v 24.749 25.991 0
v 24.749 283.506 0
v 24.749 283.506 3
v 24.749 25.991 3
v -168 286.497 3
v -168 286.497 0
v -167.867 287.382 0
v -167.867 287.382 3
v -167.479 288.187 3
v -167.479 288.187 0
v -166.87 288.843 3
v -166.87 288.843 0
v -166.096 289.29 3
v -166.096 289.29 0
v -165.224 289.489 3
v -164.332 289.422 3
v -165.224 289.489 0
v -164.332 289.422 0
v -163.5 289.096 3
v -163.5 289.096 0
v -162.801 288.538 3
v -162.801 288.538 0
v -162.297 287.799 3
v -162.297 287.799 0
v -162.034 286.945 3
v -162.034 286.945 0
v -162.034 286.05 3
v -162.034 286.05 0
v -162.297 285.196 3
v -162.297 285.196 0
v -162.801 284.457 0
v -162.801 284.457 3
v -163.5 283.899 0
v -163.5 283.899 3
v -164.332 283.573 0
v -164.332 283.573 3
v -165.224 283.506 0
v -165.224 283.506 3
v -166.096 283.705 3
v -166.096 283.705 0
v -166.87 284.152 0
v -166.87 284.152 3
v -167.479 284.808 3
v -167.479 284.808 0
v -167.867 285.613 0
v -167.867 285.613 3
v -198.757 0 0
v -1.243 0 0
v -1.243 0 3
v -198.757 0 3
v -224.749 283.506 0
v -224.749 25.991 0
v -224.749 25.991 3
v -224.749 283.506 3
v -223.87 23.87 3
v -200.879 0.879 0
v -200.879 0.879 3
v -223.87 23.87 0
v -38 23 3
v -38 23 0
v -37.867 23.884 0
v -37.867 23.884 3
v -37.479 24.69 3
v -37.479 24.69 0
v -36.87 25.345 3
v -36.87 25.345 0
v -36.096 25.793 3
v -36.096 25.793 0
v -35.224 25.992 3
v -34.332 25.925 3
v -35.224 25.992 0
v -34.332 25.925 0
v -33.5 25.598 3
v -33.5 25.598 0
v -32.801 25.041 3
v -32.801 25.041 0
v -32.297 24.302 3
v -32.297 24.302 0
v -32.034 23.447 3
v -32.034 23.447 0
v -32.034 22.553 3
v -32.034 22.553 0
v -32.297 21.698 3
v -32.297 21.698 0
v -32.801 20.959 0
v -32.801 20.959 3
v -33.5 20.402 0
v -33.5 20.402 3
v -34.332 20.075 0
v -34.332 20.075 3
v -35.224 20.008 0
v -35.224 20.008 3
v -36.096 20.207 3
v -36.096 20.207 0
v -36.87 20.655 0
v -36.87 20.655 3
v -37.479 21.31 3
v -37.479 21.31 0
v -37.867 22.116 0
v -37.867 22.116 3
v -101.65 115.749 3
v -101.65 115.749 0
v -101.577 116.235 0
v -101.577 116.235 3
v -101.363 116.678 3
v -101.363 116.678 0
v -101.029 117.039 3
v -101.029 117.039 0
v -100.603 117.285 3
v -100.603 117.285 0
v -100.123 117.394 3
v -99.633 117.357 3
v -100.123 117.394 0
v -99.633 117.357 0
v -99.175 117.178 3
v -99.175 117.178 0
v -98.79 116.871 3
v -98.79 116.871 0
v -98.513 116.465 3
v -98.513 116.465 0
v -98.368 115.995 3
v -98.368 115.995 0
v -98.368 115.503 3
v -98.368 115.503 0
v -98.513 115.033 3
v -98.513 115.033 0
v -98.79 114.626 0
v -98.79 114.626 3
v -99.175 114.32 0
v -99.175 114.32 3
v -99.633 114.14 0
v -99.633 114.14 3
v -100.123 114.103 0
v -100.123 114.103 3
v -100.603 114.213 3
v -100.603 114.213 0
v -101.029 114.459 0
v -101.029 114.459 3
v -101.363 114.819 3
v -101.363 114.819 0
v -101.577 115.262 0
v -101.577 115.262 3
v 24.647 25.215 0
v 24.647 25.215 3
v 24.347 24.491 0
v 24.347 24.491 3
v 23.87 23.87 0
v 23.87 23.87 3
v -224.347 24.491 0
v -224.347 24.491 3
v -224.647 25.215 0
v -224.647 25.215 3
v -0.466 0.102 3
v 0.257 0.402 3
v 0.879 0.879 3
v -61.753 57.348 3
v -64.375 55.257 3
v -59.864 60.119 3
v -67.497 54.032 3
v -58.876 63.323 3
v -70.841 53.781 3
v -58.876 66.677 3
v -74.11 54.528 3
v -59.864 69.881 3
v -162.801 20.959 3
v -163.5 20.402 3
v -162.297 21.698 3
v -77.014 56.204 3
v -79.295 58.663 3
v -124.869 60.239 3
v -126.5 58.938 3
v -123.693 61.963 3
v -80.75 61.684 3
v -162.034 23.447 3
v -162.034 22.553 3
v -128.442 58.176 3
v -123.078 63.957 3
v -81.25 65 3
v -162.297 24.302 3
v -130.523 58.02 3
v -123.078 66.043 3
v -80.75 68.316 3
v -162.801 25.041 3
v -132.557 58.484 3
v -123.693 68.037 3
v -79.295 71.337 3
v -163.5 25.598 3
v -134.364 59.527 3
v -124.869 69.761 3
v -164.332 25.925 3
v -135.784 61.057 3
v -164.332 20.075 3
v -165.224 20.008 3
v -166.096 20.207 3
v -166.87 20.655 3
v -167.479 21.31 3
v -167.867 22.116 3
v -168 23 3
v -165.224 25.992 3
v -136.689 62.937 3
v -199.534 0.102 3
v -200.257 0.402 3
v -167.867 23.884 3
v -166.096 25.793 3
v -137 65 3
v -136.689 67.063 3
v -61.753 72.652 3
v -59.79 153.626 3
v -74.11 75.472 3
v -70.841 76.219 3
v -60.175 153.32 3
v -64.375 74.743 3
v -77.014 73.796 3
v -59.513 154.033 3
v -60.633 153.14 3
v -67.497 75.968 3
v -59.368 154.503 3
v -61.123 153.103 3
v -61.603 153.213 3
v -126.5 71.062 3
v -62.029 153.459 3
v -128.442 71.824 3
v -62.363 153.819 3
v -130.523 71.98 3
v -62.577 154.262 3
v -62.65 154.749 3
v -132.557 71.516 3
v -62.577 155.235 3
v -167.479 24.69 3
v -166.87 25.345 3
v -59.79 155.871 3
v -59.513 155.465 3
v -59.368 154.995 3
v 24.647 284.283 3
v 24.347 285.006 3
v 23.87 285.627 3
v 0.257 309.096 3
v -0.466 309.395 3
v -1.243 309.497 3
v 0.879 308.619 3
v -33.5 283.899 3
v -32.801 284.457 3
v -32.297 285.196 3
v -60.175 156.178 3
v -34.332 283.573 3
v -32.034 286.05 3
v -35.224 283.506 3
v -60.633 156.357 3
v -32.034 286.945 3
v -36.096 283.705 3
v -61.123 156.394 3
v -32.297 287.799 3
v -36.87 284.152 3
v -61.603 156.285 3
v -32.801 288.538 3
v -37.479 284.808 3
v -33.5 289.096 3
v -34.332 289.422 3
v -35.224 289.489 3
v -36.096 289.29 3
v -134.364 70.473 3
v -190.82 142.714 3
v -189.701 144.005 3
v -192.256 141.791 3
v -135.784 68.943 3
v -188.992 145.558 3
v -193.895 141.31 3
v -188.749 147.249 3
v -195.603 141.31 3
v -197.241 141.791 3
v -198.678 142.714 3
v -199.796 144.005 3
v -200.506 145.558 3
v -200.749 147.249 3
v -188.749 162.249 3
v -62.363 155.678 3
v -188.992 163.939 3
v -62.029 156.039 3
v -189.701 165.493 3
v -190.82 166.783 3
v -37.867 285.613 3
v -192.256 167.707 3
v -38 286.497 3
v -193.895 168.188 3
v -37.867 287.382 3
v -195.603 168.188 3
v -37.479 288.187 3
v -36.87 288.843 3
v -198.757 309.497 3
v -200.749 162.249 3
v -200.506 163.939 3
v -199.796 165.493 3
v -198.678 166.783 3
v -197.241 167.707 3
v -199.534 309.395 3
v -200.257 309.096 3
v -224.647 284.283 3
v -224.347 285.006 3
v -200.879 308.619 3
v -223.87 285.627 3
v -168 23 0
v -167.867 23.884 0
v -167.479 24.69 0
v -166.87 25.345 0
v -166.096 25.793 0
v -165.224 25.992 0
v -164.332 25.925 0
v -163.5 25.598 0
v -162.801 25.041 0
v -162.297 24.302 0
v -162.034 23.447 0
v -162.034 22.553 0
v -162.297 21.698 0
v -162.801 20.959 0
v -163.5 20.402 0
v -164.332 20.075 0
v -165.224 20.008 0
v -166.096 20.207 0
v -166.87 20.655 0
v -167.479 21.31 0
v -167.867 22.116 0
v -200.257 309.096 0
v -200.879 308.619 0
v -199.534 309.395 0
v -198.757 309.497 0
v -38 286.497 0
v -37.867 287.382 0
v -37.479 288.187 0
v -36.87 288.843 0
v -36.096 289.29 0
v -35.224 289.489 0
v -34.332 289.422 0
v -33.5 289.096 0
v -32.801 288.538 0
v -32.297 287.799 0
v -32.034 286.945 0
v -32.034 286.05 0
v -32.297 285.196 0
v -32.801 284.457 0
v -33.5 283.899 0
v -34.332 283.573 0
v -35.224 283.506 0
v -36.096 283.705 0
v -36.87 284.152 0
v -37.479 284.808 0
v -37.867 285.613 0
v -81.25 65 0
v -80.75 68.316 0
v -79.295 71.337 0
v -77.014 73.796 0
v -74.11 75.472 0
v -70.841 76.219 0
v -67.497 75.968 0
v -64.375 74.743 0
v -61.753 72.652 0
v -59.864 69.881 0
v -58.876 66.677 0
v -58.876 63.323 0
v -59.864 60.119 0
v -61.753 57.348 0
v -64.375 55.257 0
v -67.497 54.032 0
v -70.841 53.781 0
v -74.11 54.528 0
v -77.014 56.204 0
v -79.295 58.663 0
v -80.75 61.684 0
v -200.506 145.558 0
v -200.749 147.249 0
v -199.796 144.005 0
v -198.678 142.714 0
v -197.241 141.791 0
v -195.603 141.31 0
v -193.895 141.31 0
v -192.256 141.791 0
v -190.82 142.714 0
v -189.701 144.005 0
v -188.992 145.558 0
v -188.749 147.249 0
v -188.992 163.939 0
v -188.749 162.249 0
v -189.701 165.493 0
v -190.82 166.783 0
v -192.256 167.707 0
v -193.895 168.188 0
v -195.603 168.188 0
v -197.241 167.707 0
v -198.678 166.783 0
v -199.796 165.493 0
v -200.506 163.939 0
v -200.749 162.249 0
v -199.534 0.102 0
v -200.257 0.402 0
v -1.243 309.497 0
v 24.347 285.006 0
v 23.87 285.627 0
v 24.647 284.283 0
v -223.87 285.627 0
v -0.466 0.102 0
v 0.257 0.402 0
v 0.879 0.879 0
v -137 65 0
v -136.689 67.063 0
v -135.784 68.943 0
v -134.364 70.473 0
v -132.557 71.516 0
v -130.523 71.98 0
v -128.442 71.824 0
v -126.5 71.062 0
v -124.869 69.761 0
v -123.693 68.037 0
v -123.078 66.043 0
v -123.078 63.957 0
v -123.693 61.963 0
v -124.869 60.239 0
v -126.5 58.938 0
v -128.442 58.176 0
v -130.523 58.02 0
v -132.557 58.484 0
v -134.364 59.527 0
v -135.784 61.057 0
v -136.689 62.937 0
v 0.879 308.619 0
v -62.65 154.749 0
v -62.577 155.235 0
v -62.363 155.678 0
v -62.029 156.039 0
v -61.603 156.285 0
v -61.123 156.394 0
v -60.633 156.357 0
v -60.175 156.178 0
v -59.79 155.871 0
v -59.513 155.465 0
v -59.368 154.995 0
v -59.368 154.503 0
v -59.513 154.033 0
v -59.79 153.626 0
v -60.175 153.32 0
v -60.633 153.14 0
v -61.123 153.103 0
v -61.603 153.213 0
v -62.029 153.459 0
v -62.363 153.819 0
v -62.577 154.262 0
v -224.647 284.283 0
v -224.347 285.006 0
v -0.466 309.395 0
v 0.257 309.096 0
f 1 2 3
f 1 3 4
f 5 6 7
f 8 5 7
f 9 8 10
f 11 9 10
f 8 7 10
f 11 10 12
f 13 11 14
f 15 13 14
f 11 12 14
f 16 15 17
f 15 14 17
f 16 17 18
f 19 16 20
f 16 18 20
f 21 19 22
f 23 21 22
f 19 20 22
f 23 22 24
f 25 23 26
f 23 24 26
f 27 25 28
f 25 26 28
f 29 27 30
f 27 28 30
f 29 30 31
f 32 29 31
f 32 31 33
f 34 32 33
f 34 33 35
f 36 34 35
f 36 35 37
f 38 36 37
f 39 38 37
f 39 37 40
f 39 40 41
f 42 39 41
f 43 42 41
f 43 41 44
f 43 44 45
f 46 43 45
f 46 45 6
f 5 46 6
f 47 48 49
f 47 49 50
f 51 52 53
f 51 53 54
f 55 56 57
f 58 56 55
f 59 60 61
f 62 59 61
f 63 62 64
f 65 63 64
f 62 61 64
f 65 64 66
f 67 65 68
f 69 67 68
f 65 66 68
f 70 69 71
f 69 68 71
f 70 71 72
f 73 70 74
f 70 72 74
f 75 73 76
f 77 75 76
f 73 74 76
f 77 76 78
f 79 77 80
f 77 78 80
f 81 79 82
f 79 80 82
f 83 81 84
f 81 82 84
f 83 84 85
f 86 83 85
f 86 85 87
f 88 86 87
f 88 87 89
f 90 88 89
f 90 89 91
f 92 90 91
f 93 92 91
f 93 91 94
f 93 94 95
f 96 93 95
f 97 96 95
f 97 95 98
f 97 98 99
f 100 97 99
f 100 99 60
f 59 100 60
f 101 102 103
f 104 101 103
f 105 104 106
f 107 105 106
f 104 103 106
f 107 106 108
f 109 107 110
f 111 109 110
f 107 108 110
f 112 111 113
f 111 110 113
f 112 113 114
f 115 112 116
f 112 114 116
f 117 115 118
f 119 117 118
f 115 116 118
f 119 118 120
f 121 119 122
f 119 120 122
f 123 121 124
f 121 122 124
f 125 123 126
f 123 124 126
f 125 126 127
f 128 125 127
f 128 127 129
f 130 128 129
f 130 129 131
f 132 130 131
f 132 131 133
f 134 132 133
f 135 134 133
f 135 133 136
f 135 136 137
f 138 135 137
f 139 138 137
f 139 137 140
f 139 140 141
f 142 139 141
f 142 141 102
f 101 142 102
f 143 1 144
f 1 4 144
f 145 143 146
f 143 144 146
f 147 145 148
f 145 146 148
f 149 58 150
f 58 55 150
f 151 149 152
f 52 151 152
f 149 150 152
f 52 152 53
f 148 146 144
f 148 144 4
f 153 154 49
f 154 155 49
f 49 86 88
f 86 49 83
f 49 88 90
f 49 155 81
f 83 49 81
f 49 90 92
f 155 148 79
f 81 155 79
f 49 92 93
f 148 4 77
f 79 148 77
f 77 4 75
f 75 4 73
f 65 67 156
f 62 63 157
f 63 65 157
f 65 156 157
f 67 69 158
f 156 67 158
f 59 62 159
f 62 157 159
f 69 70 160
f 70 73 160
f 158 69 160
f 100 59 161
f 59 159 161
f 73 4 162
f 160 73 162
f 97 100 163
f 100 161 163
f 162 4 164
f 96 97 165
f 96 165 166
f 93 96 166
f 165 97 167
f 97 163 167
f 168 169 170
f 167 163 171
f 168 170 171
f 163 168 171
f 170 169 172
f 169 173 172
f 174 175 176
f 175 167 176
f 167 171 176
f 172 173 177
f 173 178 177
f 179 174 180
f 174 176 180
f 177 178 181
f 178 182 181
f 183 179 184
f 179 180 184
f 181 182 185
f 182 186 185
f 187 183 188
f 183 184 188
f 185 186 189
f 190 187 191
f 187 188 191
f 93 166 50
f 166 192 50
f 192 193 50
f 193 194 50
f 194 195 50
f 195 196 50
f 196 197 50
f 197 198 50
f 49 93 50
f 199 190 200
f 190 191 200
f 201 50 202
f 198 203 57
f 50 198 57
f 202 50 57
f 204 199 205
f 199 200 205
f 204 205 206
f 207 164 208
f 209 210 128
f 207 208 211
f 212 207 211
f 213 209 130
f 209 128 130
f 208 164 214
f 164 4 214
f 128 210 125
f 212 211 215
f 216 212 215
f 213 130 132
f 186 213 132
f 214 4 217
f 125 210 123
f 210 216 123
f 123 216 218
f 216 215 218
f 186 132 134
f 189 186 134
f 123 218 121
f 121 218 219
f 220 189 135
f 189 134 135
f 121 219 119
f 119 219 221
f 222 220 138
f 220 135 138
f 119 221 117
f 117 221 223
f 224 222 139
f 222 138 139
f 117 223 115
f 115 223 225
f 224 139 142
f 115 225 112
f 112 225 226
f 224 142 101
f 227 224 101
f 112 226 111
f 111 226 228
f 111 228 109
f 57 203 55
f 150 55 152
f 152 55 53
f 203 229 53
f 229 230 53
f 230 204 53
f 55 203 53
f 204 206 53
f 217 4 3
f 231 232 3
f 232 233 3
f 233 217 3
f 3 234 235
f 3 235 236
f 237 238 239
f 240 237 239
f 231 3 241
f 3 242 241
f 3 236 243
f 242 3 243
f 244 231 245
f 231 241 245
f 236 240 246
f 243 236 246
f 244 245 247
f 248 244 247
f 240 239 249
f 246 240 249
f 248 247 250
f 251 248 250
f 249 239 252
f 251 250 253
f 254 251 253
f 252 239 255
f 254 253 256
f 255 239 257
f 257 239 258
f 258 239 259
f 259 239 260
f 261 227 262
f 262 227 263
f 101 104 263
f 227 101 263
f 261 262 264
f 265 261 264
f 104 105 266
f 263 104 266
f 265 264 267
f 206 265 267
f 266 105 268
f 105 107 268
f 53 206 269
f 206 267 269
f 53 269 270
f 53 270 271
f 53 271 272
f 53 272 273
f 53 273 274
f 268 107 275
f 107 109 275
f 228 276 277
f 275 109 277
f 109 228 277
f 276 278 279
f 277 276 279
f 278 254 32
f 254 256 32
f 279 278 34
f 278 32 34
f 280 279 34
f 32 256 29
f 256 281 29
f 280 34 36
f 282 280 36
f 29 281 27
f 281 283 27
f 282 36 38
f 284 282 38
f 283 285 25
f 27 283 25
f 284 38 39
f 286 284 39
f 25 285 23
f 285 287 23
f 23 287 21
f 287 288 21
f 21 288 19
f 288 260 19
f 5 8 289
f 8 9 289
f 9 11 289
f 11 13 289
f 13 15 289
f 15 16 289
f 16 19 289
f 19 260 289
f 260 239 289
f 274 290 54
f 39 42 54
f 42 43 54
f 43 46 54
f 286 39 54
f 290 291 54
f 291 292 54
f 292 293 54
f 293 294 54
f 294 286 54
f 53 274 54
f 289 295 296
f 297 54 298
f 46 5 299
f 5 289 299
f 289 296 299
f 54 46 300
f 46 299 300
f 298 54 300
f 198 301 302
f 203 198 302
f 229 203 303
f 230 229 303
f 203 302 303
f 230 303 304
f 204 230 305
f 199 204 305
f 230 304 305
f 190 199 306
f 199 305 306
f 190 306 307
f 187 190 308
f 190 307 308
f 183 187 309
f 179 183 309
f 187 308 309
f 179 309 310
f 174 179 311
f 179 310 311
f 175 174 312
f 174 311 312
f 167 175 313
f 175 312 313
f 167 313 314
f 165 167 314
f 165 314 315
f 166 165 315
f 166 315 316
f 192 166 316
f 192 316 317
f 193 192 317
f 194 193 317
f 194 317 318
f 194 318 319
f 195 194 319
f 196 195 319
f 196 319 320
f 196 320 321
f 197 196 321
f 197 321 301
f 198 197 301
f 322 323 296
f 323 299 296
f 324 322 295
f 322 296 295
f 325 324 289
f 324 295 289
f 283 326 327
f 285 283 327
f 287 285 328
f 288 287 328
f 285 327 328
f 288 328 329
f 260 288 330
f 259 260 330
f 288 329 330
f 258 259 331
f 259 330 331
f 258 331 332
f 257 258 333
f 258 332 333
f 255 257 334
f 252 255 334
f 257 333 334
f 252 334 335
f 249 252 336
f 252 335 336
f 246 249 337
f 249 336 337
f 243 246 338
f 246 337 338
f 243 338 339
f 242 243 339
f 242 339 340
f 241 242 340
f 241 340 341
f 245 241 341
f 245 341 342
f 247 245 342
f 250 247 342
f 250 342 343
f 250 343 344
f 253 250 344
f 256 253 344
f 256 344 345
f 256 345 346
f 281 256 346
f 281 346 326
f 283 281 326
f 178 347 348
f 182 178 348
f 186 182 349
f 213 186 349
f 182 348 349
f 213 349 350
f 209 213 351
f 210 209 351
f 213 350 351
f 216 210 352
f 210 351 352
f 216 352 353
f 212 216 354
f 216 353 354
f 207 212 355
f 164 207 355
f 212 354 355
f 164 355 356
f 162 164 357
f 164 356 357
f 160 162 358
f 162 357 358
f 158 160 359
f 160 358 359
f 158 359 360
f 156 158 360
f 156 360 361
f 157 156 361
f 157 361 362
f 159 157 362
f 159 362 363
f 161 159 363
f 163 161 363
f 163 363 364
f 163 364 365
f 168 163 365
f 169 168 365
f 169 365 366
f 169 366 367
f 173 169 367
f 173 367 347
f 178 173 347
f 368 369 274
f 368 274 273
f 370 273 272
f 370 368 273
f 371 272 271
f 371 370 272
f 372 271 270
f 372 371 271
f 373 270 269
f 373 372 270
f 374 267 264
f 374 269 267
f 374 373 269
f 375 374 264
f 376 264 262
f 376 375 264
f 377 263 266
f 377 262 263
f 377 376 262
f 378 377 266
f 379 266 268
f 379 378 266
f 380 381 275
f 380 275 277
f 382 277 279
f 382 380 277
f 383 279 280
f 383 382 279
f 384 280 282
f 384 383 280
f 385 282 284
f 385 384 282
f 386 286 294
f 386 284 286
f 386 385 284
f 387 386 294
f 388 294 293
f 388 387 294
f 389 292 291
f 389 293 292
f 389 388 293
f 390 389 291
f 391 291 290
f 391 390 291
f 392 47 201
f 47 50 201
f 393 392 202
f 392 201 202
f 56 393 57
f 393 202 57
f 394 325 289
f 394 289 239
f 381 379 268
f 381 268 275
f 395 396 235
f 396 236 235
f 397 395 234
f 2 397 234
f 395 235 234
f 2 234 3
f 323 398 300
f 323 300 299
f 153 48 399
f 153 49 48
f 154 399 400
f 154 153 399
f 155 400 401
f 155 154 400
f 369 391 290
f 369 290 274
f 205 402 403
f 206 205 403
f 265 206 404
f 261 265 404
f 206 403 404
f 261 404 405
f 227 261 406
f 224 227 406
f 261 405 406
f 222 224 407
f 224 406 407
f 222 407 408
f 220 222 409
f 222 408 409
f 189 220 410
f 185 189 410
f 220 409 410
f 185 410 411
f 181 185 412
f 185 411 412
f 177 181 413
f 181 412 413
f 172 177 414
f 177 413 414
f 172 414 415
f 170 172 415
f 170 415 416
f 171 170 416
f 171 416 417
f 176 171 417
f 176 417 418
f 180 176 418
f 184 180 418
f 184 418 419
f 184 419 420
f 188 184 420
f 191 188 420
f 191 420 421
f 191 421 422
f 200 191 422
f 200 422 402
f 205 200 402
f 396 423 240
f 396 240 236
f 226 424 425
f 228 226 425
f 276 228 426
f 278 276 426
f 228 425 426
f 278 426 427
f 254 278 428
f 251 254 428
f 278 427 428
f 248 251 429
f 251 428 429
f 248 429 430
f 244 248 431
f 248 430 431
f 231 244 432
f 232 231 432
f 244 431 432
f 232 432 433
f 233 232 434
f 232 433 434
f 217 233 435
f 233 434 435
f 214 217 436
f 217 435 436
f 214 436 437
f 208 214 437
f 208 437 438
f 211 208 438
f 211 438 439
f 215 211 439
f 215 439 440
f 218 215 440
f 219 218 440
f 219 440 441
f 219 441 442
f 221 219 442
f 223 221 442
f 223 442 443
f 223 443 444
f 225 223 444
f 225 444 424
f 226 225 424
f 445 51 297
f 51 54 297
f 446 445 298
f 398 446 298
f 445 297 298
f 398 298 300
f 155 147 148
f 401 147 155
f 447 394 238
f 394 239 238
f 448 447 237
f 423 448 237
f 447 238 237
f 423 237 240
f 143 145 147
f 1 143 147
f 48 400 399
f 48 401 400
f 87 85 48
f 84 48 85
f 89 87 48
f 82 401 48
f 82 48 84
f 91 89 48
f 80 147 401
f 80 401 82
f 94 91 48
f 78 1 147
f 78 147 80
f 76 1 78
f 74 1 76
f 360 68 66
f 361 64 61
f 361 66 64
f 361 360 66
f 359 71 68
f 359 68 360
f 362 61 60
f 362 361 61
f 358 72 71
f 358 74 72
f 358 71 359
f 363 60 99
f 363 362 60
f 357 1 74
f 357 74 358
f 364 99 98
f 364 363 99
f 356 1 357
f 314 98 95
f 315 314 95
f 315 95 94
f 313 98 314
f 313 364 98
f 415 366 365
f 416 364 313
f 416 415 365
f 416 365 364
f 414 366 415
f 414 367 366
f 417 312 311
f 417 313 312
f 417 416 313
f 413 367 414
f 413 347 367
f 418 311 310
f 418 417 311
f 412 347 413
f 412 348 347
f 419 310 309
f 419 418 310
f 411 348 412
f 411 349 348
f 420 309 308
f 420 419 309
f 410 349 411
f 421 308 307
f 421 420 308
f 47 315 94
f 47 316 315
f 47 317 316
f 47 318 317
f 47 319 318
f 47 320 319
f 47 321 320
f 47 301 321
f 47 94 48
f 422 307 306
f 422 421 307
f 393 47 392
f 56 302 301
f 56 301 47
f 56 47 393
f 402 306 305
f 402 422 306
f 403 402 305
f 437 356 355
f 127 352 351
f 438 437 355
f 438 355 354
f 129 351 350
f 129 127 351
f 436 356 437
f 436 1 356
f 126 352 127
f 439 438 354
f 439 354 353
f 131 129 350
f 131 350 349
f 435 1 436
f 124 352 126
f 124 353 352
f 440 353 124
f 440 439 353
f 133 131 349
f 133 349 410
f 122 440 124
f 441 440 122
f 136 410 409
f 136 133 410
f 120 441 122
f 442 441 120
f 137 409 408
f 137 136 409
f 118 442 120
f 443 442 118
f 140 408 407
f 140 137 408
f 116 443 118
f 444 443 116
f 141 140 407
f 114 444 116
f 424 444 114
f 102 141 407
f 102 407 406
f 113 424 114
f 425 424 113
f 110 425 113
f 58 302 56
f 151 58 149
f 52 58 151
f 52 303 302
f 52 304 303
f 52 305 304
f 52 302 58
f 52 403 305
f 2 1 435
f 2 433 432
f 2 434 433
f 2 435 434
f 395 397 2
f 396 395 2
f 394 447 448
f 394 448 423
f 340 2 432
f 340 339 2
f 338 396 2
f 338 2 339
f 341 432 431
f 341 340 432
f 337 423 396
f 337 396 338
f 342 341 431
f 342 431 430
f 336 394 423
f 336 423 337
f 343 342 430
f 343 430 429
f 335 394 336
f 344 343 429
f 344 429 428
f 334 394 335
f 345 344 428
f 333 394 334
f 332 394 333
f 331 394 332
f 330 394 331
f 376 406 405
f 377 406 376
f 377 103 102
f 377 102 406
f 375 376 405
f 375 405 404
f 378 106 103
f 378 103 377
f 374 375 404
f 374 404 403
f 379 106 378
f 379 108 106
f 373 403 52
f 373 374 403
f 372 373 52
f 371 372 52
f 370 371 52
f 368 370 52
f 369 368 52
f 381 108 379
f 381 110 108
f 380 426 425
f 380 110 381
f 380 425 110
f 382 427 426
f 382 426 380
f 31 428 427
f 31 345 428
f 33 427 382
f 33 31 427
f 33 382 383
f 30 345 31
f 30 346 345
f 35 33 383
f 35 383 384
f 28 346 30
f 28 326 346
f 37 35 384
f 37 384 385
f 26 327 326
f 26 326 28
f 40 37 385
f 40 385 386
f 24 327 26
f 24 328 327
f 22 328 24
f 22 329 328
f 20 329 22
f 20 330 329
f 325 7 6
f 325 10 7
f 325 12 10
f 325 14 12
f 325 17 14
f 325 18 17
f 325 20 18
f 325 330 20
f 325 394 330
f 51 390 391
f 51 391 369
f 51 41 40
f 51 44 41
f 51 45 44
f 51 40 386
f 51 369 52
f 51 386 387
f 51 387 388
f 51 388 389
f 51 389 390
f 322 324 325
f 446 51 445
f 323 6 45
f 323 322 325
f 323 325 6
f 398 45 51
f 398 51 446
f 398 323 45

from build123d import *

# Parameters (mm, degrees)
BASE_DEPTH                     = 3
CONG_1_R                       = 3
ESQUISSE20_R                   = 3
PER_AGE_PROFIL_S_DEPTH         = 4
ESQUISSE21_R                   = 1.65
PER_AGE_LIDAR_DEPTH            = 4
ESQUISSE22_R                   = 11.25
PER_AGE_ARRET_D_URGENCE_DEPTH  = 4
ESQUISSE23_R                   = 7
PER_AGE_TIRETTE_DEPTH          = 4
PER_AGE_CABLE_MANAGEMENT_DEPTH = 4


with BuildPart() as part:
    # Esquisse1 → Base (new body)
    with BuildSketch(Plane.XY):
        Polygon((0, 0), (-200, 0), (-224.748737342, 24.748737342), (-224.748737342, 284.748737342), (-200, 309.497474683), (0, 309.497474683), (24.748737342, 284.748737342), (24.748737342, 24.748737342), align=None)
    extrude(amount=BASE_DEPTH)

    # Congé1
    cong_1_edges = [part.edges().sort_by_distance(p)[0] for p in [
        (0, 0, 1.5),
        (-200, 0, 1.5),
        (-224.748737342, 24.748737342, 1.5),
        (-224.748737342, 284.748737342, 1.5),
        (-200, 309.497474683, 1.5),
        (0, 309.497474683, 1.5),
        (24.748737342, 284.748737342, 1.5),
        (24.748737342, 24.748737342, 1.5),
    ]]
    fillet(cong_1_edges, radius=CONG_1_R)

    # Esquisse20 → Perçage Profilés (cut, through all)
    with BuildSketch(Plane(origin=(0, 0, 0), x_dir=(-1, 0, 0), z_dir=(0, 0, -1))):
        with Locations((35, 286.497474683)):
            Circle(ESQUISSE20_R)
        with Locations((165, 286.497474683)):
            Circle(ESQUISSE20_R)
        with Locations((165, 23)):
            Circle(ESQUISSE20_R)
        with Locations((35, 23)):
            Circle(ESQUISSE20_R)
    extrude(amount=-PER_AGE_PROFIL_S_DEPTH, mode=Mode.SUBTRACT)

    # Esquisse21 → Perçage Lidar (cut, through all)
    with BuildSketch(Plane(origin=(0, 0, 0), x_dir=(-1, 0, 0), z_dir=(0, 0, -1))):
        with Locations((61, 154.748737342)):
            Circle(ESQUISSE21_R)
        with Locations((100, 115.748737342)):
            Circle(ESQUISSE21_R)
    extrude(amount=-PER_AGE_LIDAR_DEPTH, mode=Mode.SUBTRACT)

    # Esquisse22 → Perçage Arret d'urgence (cut, through all)
    with BuildSketch(Plane(origin=(0, 0, 0), x_dir=(-1, 0, 0), z_dir=(0, 0, -1))):
        with Locations((70, 65)):
            Circle(ESQUISSE22_R)
    extrude(amount=-PER_AGE_ARRET_D_URGENCE_DEPTH, mode=Mode.SUBTRACT)

    # Esquisse23 → Perçage Tirette (cut, through all)
    with BuildSketch(Plane(origin=(0, 0, 0), x_dir=(-1, 0, 0), z_dir=(0, 0, -1))):
        with Locations((130, 65)):
            Circle(ESQUISSE23_R)
    extrude(amount=-PER_AGE_TIRETTE_DEPTH, mode=Mode.SUBTRACT)

    # Esquisse24 → Perçage Cable management (cut, through all)
    with BuildSketch(Plane(origin=(0, 0, 0), x_dir=(-1, 0, 0), z_dir=(0, 0, -1))):
        with BuildLine():
            Line((188.748737342, 147.248737342), (188.748737342, 162.248737342))
            ThreePointArc((188.748737342, 162.248737342), (194.748737342, 168.248737342), (200.748737342, 162.248737342))
            Line((200.748737342, 162.248737342), (200.748737342, 147.248737342))
            ThreePointArc((200.748737342, 147.248737342), (194.748737342, 141.248737342), (188.748737342, 147.248737342))
        make_face()
    extrude(amount=-PER_AGE_CABLE_MANAGEMENT_DEPTH, mode=Mode.SUBTRACT)


solid = part.part
